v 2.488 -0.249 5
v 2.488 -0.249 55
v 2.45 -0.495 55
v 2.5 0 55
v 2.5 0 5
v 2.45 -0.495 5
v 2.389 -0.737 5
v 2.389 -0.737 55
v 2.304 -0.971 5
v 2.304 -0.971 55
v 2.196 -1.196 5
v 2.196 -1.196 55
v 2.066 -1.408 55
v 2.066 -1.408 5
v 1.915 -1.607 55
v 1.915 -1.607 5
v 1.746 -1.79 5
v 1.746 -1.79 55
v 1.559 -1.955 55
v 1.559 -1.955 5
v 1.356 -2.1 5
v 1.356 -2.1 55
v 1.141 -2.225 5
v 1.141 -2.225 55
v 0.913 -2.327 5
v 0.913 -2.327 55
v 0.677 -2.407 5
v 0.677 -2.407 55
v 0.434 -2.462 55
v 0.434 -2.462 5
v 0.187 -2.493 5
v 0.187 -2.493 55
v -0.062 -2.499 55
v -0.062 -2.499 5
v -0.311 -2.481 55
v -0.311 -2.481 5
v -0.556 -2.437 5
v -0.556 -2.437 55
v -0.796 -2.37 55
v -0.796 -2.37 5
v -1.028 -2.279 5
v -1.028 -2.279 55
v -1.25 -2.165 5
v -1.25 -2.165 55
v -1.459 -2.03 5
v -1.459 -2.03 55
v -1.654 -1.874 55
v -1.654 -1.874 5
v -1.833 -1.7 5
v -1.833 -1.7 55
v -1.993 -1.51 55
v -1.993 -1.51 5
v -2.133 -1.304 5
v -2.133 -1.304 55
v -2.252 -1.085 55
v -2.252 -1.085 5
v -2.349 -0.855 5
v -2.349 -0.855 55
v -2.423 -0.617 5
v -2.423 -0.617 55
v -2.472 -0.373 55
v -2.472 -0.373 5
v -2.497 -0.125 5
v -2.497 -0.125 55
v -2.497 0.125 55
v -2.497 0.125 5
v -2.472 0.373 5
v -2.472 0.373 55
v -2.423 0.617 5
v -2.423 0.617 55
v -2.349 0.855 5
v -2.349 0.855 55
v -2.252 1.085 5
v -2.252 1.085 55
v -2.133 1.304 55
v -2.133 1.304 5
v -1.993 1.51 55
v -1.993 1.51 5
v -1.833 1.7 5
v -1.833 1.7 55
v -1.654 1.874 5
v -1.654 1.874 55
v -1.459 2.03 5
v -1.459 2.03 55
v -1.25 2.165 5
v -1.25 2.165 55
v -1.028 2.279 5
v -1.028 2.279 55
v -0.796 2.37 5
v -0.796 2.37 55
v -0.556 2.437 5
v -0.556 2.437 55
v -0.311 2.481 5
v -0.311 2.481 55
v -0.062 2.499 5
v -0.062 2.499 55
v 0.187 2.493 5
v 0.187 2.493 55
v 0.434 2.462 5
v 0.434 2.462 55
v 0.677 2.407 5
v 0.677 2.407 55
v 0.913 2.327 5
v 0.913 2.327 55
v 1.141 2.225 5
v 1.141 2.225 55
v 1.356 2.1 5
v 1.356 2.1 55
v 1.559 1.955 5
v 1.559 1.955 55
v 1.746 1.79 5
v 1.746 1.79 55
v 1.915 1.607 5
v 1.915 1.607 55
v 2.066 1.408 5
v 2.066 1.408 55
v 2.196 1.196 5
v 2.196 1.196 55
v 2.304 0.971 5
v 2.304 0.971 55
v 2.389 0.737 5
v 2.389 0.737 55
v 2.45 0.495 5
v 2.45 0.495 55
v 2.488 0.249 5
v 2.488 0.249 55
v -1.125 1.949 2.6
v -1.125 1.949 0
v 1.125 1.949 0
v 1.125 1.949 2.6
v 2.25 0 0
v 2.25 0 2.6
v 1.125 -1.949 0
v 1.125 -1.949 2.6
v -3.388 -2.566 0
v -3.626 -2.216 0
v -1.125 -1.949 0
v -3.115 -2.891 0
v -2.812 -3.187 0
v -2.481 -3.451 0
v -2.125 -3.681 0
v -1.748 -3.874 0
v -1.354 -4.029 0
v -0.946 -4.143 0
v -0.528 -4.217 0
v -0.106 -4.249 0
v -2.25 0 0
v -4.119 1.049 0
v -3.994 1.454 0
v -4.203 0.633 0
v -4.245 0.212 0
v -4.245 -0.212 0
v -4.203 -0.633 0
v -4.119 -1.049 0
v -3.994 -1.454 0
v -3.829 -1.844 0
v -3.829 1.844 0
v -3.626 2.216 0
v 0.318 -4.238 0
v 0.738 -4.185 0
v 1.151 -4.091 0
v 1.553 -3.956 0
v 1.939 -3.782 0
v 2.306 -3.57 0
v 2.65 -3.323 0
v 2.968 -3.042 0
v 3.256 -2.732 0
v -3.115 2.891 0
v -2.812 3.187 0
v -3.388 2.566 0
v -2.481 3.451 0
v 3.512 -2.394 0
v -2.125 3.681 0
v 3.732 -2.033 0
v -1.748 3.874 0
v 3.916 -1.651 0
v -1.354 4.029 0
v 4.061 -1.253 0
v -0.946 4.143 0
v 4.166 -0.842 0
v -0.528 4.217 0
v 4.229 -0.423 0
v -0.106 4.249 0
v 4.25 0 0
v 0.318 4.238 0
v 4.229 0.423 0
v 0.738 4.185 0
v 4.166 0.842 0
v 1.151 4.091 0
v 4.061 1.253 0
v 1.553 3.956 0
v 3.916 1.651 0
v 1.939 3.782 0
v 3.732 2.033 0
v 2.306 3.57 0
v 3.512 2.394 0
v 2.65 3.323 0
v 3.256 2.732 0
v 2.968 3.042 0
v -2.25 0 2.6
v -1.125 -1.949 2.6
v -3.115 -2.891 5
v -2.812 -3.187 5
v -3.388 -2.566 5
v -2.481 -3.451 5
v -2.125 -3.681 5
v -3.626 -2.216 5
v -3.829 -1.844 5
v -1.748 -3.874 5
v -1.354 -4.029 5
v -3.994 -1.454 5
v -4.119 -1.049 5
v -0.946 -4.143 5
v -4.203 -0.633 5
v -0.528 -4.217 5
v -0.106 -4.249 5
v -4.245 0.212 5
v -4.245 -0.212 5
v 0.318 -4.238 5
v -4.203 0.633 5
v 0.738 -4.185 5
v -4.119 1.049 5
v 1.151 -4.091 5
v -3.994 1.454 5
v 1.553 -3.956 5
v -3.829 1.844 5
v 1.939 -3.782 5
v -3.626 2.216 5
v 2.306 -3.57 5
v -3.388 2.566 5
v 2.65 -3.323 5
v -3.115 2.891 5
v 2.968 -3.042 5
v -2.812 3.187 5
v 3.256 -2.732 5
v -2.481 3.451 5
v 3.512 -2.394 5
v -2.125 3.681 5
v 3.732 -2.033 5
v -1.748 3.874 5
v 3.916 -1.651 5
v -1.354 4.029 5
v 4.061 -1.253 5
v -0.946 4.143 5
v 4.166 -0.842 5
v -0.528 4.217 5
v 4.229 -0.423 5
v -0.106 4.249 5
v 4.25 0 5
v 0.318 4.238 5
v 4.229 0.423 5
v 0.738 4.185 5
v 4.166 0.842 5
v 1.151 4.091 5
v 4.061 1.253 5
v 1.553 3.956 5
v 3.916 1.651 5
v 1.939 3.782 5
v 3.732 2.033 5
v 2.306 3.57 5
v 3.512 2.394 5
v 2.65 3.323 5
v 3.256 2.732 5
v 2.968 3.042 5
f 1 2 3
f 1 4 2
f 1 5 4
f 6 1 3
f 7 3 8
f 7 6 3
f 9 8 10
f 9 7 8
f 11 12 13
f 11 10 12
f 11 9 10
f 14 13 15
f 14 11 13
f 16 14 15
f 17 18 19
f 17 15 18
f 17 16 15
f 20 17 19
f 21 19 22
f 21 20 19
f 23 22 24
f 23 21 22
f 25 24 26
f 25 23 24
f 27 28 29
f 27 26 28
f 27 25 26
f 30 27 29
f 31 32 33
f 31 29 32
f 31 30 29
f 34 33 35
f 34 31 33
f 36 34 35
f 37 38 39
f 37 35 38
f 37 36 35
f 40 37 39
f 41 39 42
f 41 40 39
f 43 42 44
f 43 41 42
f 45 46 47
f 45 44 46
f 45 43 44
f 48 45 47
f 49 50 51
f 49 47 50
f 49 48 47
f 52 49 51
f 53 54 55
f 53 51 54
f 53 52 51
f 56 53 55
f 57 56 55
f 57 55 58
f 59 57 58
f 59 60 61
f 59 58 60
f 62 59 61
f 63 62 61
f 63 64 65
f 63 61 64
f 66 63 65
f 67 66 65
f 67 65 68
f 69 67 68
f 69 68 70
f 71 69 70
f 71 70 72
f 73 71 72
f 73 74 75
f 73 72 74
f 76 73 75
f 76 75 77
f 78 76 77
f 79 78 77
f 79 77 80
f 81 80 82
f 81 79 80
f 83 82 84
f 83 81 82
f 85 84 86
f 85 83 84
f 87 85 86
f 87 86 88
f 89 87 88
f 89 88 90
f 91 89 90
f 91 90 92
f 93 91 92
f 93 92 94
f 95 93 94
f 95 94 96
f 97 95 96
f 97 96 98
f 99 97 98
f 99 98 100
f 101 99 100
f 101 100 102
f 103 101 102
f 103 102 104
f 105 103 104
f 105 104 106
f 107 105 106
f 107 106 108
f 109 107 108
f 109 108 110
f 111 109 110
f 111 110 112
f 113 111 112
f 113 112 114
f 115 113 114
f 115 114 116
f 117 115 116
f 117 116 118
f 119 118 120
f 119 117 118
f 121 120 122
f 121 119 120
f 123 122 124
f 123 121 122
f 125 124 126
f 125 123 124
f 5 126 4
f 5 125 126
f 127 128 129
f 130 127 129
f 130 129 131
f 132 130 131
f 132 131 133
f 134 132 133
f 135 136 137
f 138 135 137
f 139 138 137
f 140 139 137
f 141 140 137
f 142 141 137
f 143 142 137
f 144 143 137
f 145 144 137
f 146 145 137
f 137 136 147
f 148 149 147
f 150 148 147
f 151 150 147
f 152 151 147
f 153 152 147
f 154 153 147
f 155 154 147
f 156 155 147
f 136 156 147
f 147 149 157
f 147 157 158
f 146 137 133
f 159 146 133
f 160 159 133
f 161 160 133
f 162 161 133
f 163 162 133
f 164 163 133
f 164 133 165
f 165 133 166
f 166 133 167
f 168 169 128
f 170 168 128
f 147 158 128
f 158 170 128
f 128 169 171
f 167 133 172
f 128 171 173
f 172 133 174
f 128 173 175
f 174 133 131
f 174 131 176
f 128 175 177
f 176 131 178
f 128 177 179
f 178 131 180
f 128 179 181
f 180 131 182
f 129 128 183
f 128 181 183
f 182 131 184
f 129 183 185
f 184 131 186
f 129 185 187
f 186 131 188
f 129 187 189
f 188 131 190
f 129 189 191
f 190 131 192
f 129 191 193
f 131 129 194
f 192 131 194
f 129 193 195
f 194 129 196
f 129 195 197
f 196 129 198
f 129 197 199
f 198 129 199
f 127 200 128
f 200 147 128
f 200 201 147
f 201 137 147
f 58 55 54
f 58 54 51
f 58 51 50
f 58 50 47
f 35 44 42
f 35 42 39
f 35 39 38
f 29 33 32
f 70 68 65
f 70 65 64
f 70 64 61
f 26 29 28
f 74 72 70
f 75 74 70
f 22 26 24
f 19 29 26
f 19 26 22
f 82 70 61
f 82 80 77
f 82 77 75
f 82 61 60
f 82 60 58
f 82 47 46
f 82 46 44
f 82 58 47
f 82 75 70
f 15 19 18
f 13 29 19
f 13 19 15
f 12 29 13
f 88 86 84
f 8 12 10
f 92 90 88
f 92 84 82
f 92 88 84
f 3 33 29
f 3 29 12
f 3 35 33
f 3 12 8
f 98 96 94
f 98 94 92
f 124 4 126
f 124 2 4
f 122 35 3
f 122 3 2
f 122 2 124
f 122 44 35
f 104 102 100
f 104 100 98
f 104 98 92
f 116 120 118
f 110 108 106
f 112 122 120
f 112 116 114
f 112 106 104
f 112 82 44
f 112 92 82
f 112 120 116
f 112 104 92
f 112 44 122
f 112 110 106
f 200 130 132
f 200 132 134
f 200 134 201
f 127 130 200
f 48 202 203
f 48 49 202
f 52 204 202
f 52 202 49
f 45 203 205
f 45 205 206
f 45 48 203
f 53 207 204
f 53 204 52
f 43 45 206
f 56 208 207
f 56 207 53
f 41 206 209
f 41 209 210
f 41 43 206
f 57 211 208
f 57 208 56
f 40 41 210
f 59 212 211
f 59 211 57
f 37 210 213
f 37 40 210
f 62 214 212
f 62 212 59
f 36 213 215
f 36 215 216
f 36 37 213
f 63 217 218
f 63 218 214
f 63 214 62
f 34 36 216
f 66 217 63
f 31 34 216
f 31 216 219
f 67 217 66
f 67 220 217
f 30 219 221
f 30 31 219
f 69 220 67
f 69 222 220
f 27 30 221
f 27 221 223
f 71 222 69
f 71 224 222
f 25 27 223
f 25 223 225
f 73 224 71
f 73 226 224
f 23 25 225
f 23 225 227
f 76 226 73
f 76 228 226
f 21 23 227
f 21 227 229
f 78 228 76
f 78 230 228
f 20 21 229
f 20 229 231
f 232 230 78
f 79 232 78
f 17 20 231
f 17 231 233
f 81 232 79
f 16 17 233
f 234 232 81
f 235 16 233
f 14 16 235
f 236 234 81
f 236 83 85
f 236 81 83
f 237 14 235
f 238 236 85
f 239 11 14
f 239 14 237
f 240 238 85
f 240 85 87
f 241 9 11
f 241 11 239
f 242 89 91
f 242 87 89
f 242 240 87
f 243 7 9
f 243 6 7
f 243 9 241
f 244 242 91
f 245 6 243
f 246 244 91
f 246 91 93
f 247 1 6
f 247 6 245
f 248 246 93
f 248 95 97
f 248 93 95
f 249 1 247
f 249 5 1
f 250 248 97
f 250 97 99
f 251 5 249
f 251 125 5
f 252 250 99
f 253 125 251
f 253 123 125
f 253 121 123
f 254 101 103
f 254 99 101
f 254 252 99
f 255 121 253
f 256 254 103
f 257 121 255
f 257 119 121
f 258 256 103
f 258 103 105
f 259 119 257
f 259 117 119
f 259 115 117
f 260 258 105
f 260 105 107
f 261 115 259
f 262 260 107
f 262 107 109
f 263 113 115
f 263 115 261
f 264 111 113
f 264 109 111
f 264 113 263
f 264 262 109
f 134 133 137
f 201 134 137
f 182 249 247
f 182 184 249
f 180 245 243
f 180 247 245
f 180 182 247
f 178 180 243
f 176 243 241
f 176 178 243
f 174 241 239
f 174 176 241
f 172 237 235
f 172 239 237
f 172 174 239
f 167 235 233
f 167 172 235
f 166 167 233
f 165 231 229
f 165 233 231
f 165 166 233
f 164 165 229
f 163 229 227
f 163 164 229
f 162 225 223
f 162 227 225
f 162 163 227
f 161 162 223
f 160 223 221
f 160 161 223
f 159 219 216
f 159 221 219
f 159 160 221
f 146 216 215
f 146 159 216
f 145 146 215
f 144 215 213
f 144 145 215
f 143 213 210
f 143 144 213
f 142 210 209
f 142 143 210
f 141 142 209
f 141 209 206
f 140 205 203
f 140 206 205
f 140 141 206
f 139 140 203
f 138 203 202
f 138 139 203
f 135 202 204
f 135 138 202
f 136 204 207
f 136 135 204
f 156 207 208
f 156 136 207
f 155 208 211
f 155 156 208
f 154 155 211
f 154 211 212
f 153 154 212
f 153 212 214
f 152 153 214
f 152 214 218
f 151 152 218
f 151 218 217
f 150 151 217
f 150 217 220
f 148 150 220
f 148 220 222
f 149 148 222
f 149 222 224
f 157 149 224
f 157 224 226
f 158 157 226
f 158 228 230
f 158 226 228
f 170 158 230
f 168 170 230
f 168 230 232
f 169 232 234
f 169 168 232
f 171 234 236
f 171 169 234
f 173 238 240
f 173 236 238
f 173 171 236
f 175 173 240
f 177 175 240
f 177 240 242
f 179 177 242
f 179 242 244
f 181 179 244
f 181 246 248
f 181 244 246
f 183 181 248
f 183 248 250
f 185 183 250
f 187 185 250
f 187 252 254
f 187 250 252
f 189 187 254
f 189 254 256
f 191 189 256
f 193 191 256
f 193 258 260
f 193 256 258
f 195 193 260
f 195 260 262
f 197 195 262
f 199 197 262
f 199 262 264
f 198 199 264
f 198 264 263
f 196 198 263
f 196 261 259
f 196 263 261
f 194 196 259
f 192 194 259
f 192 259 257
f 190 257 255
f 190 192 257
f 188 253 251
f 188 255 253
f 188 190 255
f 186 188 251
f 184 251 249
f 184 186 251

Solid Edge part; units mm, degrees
sketch "Sketch1" plane through (0, 0, 0) normal (0, 0, 1) x (1, 0, 0)
  circle A0 centre (0, 0) radius 4.25
  dimension "D1" = 8.5
extrude "Protrusion1" add sketch "Sketch1" along normal blind 5
sketch "Sketch2" plane through (0, 0, 5) normal (0, 0, 1) x (1, 0, 0)
  circle A0 centre (0, 0) radius 2.5
extrude "ExtrudedProtrusion_2" add sketch "Sketch2" along normal blind 50
sketch "Sketch3" plane through (0, 0, 0) normal (0, 0, -1) x (-1, 0, 0)
  line L0 (2.25, 0) -> (1.125, 1.9486)
  line L1 (1.125, 1.9486) -> (-1.125, 1.9486)
  line L2 (-1.125, 1.9486) -> (-2.25, 0)
  line L3 (-2.25, 0) -> (-1.125, -1.9486)
  line L4 (-1.125, -1.9486) -> (1.125, -1.9486)
  line L5 (1.125, -1.9486) -> (2.25, 0)
extrude "ExtrudedCutout_1" cut sketch "Sketch3" against normal blind 2.6
cosmetic_thread "Thread_1" size "M5" thread depth 24
